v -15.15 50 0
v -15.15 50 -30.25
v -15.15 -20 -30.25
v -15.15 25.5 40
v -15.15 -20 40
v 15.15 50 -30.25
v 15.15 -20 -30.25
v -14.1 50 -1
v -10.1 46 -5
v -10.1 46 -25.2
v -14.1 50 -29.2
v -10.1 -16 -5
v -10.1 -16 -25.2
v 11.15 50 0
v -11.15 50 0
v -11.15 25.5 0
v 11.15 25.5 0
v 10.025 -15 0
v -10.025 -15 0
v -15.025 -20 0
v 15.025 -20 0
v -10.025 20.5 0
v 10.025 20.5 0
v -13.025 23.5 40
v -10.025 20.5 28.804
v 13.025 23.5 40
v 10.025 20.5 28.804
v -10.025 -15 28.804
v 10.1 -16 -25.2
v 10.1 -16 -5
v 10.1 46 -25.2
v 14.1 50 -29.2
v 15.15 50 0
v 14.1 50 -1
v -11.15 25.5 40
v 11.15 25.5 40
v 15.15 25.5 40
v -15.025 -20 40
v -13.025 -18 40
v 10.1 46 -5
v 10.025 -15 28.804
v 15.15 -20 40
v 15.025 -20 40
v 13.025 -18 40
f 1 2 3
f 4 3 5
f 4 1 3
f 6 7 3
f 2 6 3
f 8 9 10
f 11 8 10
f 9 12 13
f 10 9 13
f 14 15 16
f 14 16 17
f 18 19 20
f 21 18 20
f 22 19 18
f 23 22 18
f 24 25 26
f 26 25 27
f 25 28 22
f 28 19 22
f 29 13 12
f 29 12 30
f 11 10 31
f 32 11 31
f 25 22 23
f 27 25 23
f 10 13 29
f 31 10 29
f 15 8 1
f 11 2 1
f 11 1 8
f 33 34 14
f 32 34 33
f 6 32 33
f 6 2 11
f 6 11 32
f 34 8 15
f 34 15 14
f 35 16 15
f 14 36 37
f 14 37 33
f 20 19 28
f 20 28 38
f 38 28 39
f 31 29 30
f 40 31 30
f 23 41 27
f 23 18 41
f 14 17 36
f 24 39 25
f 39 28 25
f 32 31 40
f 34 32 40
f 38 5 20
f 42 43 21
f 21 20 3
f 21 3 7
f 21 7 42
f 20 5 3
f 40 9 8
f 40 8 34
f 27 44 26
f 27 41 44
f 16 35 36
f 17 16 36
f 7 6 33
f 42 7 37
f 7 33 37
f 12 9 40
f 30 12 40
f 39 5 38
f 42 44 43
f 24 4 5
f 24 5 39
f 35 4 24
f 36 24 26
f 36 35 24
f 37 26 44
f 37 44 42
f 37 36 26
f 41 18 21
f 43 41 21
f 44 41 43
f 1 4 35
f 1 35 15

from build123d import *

# Parameters (mm, degrees)
CROQUIS2_W              = 30.3
CROQUIS2_H              = 70
SALIENTE_EXTRUIR2_DEPTH = 5
SALIENTE_EXTRUIR3_START = -20
SALIENTE_EXTRUIR3_DEPTH = 70
SALIENTE_EXTRUIR4_START = -20
CROQUIS4_W              = 20.2
CROQUIS4_H              = 20.2
SALIENTE_EXTRUIR4_DEPTH = 4
CHAFL_N4_SIZE           = 4
CROQUIS6_W              = 30.3
CROQUIS6_H              = 5
CROQUIS6_W_2            = 5.125
CROQUIS6_H_2            = 40.5
SALIENTE_EXTRUIR6_DEPTH = 40
SALIENTE_EXTRUIR7_START = -15.15
SALIENTE_EXTRUIR7_DEPTH = 30.3
CROQUIS8_W              = 22.3
CROQUIS8_H              = 24.5
CORTAR_EXTRUIR1_DEPTH   = 40
CHAFL_N7_SIZE           = 3
CHAFL_N7_SIZE2          = 11.196152423
CHAFL_N9_SIZE           = 5


with BuildPart() as part:
    # Croquis2 → Saliente-Extruir2 (new body)
    with BuildSketch(Plane.XY):
        with Locations((0, 15)):
            Rectangle(CROQUIS2_W, CROQUIS2_H)
    extrude(amount=-SALIENTE_EXTRUIR2_DEPTH)

    # Croquis3 → Saliente-Extruir3 (add)
    with BuildSketch(Plane(origin=(0, 0, 0), x_dir=(1, 0, 0), z_dir=(0, 1, 0)).offset(SALIENTE_EXTRUIR3_START)):
        Polygon((-15.15, 30.25), (-15.15, 5), (-10.1, 5), (-10.1, 25.2), (10.1, 25.2), (10.1, 5), (15.15, 5), (15.15, 30.25), align=None)
    extrude(amount=SALIENTE_EXTRUIR3_DEPTH)

    # Croquis4 → Saliente-Extruir4 (add)
    with BuildSketch(Plane(origin=(0, 0, 0), x_dir=(1, 0, 0), z_dir=(0, 1, 0)).offset(SALIENTE_EXTRUIR4_START)):
        with Locations((0, 15.1)):
            Rectangle(CROQUIS4_W, CROQUIS4_H)
    extrude(amount=SALIENTE_EXTRUIR4_DEPTH)

    # Chaflán4
    chafl_n4_edges = [part.edges().sort_by_distance(p)[0] for p in [
        (0, 50, -5),
        (10.1, 50, -15.1),
        (0, 50, -25.2),
        (-10.1, 50, -15.1),
    ]]
    chamfer(chafl_n4_edges, length=CHAFL_N4_SIZE)

    # Croquis6 → Saliente-Extruir6 (add)
    with BuildSketch(Plane.XY):
        with Locations((0, 23)):
            Rectangle(CROQUIS6_W, CROQUIS6_H)
        with Locations((-12.5875, 0.25)):
            Rectangle(CROQUIS6_W_2, CROQUIS6_H_2)
        with Locations((12.5875, 0.25)):
            Rectangle(CROQUIS6_W_2, CROQUIS6_H_2)
    extrude(amount=SALIENTE_EXTRUIR6_DEPTH)

    # Croquis7 → Saliente-Extruir7 (add)
    with BuildSketch(Plane(origin=(0, 0, 0), x_dir=(0, 0, -1), z_dir=(1, 0, 0)).offset(SALIENTE_EXTRUIR7_START)):
        Polygon((-40, 25.5), (0, 50), (0, 25.5), align=None)
    extrude(amount=SALIENTE_EXTRUIR7_DEPTH)

    # Croquis8 → Cortar-Extruir1 (cut)
    with BuildSketch(Plane.XY):
        with Locations((0, 37.75)):
            Rectangle(CROQUIS8_W, CROQUIS8_H)
    extrude(amount=CORTAR_EXTRUIR1_DEPTH, mode=Mode.SUBTRACT)

    # Chaflán7
    chafl_n7_edges = [part.edges().sort_by_distance(p)[0] for p in [
        (-10.025, 0.25, 40),
        (0, 20.5, 40),
        (10.025, 0.25, 40),
    ]]
    chafl_n7_side = [part.faces().sort_by_distance(p)[0] for p in [
        (14.603342886, 2.75, 40),
    ]]
    chamfer(chafl_n7_edges, length=CHAFL_N7_SIZE, length2=CHAFL_N7_SIZE2, reference=chafl_n7_side[0])

    # Chaflán9
    chafl_n9_edges = [part.edges().sort_by_distance(p)[0] for p in [
        (10.025, -20, 14.401923789),
        (-10.025, -20, 14.401923789),
    ]]
    chamfer(chafl_n9_edges, length=CHAFL_N9_SIZE)


solid = part.part
